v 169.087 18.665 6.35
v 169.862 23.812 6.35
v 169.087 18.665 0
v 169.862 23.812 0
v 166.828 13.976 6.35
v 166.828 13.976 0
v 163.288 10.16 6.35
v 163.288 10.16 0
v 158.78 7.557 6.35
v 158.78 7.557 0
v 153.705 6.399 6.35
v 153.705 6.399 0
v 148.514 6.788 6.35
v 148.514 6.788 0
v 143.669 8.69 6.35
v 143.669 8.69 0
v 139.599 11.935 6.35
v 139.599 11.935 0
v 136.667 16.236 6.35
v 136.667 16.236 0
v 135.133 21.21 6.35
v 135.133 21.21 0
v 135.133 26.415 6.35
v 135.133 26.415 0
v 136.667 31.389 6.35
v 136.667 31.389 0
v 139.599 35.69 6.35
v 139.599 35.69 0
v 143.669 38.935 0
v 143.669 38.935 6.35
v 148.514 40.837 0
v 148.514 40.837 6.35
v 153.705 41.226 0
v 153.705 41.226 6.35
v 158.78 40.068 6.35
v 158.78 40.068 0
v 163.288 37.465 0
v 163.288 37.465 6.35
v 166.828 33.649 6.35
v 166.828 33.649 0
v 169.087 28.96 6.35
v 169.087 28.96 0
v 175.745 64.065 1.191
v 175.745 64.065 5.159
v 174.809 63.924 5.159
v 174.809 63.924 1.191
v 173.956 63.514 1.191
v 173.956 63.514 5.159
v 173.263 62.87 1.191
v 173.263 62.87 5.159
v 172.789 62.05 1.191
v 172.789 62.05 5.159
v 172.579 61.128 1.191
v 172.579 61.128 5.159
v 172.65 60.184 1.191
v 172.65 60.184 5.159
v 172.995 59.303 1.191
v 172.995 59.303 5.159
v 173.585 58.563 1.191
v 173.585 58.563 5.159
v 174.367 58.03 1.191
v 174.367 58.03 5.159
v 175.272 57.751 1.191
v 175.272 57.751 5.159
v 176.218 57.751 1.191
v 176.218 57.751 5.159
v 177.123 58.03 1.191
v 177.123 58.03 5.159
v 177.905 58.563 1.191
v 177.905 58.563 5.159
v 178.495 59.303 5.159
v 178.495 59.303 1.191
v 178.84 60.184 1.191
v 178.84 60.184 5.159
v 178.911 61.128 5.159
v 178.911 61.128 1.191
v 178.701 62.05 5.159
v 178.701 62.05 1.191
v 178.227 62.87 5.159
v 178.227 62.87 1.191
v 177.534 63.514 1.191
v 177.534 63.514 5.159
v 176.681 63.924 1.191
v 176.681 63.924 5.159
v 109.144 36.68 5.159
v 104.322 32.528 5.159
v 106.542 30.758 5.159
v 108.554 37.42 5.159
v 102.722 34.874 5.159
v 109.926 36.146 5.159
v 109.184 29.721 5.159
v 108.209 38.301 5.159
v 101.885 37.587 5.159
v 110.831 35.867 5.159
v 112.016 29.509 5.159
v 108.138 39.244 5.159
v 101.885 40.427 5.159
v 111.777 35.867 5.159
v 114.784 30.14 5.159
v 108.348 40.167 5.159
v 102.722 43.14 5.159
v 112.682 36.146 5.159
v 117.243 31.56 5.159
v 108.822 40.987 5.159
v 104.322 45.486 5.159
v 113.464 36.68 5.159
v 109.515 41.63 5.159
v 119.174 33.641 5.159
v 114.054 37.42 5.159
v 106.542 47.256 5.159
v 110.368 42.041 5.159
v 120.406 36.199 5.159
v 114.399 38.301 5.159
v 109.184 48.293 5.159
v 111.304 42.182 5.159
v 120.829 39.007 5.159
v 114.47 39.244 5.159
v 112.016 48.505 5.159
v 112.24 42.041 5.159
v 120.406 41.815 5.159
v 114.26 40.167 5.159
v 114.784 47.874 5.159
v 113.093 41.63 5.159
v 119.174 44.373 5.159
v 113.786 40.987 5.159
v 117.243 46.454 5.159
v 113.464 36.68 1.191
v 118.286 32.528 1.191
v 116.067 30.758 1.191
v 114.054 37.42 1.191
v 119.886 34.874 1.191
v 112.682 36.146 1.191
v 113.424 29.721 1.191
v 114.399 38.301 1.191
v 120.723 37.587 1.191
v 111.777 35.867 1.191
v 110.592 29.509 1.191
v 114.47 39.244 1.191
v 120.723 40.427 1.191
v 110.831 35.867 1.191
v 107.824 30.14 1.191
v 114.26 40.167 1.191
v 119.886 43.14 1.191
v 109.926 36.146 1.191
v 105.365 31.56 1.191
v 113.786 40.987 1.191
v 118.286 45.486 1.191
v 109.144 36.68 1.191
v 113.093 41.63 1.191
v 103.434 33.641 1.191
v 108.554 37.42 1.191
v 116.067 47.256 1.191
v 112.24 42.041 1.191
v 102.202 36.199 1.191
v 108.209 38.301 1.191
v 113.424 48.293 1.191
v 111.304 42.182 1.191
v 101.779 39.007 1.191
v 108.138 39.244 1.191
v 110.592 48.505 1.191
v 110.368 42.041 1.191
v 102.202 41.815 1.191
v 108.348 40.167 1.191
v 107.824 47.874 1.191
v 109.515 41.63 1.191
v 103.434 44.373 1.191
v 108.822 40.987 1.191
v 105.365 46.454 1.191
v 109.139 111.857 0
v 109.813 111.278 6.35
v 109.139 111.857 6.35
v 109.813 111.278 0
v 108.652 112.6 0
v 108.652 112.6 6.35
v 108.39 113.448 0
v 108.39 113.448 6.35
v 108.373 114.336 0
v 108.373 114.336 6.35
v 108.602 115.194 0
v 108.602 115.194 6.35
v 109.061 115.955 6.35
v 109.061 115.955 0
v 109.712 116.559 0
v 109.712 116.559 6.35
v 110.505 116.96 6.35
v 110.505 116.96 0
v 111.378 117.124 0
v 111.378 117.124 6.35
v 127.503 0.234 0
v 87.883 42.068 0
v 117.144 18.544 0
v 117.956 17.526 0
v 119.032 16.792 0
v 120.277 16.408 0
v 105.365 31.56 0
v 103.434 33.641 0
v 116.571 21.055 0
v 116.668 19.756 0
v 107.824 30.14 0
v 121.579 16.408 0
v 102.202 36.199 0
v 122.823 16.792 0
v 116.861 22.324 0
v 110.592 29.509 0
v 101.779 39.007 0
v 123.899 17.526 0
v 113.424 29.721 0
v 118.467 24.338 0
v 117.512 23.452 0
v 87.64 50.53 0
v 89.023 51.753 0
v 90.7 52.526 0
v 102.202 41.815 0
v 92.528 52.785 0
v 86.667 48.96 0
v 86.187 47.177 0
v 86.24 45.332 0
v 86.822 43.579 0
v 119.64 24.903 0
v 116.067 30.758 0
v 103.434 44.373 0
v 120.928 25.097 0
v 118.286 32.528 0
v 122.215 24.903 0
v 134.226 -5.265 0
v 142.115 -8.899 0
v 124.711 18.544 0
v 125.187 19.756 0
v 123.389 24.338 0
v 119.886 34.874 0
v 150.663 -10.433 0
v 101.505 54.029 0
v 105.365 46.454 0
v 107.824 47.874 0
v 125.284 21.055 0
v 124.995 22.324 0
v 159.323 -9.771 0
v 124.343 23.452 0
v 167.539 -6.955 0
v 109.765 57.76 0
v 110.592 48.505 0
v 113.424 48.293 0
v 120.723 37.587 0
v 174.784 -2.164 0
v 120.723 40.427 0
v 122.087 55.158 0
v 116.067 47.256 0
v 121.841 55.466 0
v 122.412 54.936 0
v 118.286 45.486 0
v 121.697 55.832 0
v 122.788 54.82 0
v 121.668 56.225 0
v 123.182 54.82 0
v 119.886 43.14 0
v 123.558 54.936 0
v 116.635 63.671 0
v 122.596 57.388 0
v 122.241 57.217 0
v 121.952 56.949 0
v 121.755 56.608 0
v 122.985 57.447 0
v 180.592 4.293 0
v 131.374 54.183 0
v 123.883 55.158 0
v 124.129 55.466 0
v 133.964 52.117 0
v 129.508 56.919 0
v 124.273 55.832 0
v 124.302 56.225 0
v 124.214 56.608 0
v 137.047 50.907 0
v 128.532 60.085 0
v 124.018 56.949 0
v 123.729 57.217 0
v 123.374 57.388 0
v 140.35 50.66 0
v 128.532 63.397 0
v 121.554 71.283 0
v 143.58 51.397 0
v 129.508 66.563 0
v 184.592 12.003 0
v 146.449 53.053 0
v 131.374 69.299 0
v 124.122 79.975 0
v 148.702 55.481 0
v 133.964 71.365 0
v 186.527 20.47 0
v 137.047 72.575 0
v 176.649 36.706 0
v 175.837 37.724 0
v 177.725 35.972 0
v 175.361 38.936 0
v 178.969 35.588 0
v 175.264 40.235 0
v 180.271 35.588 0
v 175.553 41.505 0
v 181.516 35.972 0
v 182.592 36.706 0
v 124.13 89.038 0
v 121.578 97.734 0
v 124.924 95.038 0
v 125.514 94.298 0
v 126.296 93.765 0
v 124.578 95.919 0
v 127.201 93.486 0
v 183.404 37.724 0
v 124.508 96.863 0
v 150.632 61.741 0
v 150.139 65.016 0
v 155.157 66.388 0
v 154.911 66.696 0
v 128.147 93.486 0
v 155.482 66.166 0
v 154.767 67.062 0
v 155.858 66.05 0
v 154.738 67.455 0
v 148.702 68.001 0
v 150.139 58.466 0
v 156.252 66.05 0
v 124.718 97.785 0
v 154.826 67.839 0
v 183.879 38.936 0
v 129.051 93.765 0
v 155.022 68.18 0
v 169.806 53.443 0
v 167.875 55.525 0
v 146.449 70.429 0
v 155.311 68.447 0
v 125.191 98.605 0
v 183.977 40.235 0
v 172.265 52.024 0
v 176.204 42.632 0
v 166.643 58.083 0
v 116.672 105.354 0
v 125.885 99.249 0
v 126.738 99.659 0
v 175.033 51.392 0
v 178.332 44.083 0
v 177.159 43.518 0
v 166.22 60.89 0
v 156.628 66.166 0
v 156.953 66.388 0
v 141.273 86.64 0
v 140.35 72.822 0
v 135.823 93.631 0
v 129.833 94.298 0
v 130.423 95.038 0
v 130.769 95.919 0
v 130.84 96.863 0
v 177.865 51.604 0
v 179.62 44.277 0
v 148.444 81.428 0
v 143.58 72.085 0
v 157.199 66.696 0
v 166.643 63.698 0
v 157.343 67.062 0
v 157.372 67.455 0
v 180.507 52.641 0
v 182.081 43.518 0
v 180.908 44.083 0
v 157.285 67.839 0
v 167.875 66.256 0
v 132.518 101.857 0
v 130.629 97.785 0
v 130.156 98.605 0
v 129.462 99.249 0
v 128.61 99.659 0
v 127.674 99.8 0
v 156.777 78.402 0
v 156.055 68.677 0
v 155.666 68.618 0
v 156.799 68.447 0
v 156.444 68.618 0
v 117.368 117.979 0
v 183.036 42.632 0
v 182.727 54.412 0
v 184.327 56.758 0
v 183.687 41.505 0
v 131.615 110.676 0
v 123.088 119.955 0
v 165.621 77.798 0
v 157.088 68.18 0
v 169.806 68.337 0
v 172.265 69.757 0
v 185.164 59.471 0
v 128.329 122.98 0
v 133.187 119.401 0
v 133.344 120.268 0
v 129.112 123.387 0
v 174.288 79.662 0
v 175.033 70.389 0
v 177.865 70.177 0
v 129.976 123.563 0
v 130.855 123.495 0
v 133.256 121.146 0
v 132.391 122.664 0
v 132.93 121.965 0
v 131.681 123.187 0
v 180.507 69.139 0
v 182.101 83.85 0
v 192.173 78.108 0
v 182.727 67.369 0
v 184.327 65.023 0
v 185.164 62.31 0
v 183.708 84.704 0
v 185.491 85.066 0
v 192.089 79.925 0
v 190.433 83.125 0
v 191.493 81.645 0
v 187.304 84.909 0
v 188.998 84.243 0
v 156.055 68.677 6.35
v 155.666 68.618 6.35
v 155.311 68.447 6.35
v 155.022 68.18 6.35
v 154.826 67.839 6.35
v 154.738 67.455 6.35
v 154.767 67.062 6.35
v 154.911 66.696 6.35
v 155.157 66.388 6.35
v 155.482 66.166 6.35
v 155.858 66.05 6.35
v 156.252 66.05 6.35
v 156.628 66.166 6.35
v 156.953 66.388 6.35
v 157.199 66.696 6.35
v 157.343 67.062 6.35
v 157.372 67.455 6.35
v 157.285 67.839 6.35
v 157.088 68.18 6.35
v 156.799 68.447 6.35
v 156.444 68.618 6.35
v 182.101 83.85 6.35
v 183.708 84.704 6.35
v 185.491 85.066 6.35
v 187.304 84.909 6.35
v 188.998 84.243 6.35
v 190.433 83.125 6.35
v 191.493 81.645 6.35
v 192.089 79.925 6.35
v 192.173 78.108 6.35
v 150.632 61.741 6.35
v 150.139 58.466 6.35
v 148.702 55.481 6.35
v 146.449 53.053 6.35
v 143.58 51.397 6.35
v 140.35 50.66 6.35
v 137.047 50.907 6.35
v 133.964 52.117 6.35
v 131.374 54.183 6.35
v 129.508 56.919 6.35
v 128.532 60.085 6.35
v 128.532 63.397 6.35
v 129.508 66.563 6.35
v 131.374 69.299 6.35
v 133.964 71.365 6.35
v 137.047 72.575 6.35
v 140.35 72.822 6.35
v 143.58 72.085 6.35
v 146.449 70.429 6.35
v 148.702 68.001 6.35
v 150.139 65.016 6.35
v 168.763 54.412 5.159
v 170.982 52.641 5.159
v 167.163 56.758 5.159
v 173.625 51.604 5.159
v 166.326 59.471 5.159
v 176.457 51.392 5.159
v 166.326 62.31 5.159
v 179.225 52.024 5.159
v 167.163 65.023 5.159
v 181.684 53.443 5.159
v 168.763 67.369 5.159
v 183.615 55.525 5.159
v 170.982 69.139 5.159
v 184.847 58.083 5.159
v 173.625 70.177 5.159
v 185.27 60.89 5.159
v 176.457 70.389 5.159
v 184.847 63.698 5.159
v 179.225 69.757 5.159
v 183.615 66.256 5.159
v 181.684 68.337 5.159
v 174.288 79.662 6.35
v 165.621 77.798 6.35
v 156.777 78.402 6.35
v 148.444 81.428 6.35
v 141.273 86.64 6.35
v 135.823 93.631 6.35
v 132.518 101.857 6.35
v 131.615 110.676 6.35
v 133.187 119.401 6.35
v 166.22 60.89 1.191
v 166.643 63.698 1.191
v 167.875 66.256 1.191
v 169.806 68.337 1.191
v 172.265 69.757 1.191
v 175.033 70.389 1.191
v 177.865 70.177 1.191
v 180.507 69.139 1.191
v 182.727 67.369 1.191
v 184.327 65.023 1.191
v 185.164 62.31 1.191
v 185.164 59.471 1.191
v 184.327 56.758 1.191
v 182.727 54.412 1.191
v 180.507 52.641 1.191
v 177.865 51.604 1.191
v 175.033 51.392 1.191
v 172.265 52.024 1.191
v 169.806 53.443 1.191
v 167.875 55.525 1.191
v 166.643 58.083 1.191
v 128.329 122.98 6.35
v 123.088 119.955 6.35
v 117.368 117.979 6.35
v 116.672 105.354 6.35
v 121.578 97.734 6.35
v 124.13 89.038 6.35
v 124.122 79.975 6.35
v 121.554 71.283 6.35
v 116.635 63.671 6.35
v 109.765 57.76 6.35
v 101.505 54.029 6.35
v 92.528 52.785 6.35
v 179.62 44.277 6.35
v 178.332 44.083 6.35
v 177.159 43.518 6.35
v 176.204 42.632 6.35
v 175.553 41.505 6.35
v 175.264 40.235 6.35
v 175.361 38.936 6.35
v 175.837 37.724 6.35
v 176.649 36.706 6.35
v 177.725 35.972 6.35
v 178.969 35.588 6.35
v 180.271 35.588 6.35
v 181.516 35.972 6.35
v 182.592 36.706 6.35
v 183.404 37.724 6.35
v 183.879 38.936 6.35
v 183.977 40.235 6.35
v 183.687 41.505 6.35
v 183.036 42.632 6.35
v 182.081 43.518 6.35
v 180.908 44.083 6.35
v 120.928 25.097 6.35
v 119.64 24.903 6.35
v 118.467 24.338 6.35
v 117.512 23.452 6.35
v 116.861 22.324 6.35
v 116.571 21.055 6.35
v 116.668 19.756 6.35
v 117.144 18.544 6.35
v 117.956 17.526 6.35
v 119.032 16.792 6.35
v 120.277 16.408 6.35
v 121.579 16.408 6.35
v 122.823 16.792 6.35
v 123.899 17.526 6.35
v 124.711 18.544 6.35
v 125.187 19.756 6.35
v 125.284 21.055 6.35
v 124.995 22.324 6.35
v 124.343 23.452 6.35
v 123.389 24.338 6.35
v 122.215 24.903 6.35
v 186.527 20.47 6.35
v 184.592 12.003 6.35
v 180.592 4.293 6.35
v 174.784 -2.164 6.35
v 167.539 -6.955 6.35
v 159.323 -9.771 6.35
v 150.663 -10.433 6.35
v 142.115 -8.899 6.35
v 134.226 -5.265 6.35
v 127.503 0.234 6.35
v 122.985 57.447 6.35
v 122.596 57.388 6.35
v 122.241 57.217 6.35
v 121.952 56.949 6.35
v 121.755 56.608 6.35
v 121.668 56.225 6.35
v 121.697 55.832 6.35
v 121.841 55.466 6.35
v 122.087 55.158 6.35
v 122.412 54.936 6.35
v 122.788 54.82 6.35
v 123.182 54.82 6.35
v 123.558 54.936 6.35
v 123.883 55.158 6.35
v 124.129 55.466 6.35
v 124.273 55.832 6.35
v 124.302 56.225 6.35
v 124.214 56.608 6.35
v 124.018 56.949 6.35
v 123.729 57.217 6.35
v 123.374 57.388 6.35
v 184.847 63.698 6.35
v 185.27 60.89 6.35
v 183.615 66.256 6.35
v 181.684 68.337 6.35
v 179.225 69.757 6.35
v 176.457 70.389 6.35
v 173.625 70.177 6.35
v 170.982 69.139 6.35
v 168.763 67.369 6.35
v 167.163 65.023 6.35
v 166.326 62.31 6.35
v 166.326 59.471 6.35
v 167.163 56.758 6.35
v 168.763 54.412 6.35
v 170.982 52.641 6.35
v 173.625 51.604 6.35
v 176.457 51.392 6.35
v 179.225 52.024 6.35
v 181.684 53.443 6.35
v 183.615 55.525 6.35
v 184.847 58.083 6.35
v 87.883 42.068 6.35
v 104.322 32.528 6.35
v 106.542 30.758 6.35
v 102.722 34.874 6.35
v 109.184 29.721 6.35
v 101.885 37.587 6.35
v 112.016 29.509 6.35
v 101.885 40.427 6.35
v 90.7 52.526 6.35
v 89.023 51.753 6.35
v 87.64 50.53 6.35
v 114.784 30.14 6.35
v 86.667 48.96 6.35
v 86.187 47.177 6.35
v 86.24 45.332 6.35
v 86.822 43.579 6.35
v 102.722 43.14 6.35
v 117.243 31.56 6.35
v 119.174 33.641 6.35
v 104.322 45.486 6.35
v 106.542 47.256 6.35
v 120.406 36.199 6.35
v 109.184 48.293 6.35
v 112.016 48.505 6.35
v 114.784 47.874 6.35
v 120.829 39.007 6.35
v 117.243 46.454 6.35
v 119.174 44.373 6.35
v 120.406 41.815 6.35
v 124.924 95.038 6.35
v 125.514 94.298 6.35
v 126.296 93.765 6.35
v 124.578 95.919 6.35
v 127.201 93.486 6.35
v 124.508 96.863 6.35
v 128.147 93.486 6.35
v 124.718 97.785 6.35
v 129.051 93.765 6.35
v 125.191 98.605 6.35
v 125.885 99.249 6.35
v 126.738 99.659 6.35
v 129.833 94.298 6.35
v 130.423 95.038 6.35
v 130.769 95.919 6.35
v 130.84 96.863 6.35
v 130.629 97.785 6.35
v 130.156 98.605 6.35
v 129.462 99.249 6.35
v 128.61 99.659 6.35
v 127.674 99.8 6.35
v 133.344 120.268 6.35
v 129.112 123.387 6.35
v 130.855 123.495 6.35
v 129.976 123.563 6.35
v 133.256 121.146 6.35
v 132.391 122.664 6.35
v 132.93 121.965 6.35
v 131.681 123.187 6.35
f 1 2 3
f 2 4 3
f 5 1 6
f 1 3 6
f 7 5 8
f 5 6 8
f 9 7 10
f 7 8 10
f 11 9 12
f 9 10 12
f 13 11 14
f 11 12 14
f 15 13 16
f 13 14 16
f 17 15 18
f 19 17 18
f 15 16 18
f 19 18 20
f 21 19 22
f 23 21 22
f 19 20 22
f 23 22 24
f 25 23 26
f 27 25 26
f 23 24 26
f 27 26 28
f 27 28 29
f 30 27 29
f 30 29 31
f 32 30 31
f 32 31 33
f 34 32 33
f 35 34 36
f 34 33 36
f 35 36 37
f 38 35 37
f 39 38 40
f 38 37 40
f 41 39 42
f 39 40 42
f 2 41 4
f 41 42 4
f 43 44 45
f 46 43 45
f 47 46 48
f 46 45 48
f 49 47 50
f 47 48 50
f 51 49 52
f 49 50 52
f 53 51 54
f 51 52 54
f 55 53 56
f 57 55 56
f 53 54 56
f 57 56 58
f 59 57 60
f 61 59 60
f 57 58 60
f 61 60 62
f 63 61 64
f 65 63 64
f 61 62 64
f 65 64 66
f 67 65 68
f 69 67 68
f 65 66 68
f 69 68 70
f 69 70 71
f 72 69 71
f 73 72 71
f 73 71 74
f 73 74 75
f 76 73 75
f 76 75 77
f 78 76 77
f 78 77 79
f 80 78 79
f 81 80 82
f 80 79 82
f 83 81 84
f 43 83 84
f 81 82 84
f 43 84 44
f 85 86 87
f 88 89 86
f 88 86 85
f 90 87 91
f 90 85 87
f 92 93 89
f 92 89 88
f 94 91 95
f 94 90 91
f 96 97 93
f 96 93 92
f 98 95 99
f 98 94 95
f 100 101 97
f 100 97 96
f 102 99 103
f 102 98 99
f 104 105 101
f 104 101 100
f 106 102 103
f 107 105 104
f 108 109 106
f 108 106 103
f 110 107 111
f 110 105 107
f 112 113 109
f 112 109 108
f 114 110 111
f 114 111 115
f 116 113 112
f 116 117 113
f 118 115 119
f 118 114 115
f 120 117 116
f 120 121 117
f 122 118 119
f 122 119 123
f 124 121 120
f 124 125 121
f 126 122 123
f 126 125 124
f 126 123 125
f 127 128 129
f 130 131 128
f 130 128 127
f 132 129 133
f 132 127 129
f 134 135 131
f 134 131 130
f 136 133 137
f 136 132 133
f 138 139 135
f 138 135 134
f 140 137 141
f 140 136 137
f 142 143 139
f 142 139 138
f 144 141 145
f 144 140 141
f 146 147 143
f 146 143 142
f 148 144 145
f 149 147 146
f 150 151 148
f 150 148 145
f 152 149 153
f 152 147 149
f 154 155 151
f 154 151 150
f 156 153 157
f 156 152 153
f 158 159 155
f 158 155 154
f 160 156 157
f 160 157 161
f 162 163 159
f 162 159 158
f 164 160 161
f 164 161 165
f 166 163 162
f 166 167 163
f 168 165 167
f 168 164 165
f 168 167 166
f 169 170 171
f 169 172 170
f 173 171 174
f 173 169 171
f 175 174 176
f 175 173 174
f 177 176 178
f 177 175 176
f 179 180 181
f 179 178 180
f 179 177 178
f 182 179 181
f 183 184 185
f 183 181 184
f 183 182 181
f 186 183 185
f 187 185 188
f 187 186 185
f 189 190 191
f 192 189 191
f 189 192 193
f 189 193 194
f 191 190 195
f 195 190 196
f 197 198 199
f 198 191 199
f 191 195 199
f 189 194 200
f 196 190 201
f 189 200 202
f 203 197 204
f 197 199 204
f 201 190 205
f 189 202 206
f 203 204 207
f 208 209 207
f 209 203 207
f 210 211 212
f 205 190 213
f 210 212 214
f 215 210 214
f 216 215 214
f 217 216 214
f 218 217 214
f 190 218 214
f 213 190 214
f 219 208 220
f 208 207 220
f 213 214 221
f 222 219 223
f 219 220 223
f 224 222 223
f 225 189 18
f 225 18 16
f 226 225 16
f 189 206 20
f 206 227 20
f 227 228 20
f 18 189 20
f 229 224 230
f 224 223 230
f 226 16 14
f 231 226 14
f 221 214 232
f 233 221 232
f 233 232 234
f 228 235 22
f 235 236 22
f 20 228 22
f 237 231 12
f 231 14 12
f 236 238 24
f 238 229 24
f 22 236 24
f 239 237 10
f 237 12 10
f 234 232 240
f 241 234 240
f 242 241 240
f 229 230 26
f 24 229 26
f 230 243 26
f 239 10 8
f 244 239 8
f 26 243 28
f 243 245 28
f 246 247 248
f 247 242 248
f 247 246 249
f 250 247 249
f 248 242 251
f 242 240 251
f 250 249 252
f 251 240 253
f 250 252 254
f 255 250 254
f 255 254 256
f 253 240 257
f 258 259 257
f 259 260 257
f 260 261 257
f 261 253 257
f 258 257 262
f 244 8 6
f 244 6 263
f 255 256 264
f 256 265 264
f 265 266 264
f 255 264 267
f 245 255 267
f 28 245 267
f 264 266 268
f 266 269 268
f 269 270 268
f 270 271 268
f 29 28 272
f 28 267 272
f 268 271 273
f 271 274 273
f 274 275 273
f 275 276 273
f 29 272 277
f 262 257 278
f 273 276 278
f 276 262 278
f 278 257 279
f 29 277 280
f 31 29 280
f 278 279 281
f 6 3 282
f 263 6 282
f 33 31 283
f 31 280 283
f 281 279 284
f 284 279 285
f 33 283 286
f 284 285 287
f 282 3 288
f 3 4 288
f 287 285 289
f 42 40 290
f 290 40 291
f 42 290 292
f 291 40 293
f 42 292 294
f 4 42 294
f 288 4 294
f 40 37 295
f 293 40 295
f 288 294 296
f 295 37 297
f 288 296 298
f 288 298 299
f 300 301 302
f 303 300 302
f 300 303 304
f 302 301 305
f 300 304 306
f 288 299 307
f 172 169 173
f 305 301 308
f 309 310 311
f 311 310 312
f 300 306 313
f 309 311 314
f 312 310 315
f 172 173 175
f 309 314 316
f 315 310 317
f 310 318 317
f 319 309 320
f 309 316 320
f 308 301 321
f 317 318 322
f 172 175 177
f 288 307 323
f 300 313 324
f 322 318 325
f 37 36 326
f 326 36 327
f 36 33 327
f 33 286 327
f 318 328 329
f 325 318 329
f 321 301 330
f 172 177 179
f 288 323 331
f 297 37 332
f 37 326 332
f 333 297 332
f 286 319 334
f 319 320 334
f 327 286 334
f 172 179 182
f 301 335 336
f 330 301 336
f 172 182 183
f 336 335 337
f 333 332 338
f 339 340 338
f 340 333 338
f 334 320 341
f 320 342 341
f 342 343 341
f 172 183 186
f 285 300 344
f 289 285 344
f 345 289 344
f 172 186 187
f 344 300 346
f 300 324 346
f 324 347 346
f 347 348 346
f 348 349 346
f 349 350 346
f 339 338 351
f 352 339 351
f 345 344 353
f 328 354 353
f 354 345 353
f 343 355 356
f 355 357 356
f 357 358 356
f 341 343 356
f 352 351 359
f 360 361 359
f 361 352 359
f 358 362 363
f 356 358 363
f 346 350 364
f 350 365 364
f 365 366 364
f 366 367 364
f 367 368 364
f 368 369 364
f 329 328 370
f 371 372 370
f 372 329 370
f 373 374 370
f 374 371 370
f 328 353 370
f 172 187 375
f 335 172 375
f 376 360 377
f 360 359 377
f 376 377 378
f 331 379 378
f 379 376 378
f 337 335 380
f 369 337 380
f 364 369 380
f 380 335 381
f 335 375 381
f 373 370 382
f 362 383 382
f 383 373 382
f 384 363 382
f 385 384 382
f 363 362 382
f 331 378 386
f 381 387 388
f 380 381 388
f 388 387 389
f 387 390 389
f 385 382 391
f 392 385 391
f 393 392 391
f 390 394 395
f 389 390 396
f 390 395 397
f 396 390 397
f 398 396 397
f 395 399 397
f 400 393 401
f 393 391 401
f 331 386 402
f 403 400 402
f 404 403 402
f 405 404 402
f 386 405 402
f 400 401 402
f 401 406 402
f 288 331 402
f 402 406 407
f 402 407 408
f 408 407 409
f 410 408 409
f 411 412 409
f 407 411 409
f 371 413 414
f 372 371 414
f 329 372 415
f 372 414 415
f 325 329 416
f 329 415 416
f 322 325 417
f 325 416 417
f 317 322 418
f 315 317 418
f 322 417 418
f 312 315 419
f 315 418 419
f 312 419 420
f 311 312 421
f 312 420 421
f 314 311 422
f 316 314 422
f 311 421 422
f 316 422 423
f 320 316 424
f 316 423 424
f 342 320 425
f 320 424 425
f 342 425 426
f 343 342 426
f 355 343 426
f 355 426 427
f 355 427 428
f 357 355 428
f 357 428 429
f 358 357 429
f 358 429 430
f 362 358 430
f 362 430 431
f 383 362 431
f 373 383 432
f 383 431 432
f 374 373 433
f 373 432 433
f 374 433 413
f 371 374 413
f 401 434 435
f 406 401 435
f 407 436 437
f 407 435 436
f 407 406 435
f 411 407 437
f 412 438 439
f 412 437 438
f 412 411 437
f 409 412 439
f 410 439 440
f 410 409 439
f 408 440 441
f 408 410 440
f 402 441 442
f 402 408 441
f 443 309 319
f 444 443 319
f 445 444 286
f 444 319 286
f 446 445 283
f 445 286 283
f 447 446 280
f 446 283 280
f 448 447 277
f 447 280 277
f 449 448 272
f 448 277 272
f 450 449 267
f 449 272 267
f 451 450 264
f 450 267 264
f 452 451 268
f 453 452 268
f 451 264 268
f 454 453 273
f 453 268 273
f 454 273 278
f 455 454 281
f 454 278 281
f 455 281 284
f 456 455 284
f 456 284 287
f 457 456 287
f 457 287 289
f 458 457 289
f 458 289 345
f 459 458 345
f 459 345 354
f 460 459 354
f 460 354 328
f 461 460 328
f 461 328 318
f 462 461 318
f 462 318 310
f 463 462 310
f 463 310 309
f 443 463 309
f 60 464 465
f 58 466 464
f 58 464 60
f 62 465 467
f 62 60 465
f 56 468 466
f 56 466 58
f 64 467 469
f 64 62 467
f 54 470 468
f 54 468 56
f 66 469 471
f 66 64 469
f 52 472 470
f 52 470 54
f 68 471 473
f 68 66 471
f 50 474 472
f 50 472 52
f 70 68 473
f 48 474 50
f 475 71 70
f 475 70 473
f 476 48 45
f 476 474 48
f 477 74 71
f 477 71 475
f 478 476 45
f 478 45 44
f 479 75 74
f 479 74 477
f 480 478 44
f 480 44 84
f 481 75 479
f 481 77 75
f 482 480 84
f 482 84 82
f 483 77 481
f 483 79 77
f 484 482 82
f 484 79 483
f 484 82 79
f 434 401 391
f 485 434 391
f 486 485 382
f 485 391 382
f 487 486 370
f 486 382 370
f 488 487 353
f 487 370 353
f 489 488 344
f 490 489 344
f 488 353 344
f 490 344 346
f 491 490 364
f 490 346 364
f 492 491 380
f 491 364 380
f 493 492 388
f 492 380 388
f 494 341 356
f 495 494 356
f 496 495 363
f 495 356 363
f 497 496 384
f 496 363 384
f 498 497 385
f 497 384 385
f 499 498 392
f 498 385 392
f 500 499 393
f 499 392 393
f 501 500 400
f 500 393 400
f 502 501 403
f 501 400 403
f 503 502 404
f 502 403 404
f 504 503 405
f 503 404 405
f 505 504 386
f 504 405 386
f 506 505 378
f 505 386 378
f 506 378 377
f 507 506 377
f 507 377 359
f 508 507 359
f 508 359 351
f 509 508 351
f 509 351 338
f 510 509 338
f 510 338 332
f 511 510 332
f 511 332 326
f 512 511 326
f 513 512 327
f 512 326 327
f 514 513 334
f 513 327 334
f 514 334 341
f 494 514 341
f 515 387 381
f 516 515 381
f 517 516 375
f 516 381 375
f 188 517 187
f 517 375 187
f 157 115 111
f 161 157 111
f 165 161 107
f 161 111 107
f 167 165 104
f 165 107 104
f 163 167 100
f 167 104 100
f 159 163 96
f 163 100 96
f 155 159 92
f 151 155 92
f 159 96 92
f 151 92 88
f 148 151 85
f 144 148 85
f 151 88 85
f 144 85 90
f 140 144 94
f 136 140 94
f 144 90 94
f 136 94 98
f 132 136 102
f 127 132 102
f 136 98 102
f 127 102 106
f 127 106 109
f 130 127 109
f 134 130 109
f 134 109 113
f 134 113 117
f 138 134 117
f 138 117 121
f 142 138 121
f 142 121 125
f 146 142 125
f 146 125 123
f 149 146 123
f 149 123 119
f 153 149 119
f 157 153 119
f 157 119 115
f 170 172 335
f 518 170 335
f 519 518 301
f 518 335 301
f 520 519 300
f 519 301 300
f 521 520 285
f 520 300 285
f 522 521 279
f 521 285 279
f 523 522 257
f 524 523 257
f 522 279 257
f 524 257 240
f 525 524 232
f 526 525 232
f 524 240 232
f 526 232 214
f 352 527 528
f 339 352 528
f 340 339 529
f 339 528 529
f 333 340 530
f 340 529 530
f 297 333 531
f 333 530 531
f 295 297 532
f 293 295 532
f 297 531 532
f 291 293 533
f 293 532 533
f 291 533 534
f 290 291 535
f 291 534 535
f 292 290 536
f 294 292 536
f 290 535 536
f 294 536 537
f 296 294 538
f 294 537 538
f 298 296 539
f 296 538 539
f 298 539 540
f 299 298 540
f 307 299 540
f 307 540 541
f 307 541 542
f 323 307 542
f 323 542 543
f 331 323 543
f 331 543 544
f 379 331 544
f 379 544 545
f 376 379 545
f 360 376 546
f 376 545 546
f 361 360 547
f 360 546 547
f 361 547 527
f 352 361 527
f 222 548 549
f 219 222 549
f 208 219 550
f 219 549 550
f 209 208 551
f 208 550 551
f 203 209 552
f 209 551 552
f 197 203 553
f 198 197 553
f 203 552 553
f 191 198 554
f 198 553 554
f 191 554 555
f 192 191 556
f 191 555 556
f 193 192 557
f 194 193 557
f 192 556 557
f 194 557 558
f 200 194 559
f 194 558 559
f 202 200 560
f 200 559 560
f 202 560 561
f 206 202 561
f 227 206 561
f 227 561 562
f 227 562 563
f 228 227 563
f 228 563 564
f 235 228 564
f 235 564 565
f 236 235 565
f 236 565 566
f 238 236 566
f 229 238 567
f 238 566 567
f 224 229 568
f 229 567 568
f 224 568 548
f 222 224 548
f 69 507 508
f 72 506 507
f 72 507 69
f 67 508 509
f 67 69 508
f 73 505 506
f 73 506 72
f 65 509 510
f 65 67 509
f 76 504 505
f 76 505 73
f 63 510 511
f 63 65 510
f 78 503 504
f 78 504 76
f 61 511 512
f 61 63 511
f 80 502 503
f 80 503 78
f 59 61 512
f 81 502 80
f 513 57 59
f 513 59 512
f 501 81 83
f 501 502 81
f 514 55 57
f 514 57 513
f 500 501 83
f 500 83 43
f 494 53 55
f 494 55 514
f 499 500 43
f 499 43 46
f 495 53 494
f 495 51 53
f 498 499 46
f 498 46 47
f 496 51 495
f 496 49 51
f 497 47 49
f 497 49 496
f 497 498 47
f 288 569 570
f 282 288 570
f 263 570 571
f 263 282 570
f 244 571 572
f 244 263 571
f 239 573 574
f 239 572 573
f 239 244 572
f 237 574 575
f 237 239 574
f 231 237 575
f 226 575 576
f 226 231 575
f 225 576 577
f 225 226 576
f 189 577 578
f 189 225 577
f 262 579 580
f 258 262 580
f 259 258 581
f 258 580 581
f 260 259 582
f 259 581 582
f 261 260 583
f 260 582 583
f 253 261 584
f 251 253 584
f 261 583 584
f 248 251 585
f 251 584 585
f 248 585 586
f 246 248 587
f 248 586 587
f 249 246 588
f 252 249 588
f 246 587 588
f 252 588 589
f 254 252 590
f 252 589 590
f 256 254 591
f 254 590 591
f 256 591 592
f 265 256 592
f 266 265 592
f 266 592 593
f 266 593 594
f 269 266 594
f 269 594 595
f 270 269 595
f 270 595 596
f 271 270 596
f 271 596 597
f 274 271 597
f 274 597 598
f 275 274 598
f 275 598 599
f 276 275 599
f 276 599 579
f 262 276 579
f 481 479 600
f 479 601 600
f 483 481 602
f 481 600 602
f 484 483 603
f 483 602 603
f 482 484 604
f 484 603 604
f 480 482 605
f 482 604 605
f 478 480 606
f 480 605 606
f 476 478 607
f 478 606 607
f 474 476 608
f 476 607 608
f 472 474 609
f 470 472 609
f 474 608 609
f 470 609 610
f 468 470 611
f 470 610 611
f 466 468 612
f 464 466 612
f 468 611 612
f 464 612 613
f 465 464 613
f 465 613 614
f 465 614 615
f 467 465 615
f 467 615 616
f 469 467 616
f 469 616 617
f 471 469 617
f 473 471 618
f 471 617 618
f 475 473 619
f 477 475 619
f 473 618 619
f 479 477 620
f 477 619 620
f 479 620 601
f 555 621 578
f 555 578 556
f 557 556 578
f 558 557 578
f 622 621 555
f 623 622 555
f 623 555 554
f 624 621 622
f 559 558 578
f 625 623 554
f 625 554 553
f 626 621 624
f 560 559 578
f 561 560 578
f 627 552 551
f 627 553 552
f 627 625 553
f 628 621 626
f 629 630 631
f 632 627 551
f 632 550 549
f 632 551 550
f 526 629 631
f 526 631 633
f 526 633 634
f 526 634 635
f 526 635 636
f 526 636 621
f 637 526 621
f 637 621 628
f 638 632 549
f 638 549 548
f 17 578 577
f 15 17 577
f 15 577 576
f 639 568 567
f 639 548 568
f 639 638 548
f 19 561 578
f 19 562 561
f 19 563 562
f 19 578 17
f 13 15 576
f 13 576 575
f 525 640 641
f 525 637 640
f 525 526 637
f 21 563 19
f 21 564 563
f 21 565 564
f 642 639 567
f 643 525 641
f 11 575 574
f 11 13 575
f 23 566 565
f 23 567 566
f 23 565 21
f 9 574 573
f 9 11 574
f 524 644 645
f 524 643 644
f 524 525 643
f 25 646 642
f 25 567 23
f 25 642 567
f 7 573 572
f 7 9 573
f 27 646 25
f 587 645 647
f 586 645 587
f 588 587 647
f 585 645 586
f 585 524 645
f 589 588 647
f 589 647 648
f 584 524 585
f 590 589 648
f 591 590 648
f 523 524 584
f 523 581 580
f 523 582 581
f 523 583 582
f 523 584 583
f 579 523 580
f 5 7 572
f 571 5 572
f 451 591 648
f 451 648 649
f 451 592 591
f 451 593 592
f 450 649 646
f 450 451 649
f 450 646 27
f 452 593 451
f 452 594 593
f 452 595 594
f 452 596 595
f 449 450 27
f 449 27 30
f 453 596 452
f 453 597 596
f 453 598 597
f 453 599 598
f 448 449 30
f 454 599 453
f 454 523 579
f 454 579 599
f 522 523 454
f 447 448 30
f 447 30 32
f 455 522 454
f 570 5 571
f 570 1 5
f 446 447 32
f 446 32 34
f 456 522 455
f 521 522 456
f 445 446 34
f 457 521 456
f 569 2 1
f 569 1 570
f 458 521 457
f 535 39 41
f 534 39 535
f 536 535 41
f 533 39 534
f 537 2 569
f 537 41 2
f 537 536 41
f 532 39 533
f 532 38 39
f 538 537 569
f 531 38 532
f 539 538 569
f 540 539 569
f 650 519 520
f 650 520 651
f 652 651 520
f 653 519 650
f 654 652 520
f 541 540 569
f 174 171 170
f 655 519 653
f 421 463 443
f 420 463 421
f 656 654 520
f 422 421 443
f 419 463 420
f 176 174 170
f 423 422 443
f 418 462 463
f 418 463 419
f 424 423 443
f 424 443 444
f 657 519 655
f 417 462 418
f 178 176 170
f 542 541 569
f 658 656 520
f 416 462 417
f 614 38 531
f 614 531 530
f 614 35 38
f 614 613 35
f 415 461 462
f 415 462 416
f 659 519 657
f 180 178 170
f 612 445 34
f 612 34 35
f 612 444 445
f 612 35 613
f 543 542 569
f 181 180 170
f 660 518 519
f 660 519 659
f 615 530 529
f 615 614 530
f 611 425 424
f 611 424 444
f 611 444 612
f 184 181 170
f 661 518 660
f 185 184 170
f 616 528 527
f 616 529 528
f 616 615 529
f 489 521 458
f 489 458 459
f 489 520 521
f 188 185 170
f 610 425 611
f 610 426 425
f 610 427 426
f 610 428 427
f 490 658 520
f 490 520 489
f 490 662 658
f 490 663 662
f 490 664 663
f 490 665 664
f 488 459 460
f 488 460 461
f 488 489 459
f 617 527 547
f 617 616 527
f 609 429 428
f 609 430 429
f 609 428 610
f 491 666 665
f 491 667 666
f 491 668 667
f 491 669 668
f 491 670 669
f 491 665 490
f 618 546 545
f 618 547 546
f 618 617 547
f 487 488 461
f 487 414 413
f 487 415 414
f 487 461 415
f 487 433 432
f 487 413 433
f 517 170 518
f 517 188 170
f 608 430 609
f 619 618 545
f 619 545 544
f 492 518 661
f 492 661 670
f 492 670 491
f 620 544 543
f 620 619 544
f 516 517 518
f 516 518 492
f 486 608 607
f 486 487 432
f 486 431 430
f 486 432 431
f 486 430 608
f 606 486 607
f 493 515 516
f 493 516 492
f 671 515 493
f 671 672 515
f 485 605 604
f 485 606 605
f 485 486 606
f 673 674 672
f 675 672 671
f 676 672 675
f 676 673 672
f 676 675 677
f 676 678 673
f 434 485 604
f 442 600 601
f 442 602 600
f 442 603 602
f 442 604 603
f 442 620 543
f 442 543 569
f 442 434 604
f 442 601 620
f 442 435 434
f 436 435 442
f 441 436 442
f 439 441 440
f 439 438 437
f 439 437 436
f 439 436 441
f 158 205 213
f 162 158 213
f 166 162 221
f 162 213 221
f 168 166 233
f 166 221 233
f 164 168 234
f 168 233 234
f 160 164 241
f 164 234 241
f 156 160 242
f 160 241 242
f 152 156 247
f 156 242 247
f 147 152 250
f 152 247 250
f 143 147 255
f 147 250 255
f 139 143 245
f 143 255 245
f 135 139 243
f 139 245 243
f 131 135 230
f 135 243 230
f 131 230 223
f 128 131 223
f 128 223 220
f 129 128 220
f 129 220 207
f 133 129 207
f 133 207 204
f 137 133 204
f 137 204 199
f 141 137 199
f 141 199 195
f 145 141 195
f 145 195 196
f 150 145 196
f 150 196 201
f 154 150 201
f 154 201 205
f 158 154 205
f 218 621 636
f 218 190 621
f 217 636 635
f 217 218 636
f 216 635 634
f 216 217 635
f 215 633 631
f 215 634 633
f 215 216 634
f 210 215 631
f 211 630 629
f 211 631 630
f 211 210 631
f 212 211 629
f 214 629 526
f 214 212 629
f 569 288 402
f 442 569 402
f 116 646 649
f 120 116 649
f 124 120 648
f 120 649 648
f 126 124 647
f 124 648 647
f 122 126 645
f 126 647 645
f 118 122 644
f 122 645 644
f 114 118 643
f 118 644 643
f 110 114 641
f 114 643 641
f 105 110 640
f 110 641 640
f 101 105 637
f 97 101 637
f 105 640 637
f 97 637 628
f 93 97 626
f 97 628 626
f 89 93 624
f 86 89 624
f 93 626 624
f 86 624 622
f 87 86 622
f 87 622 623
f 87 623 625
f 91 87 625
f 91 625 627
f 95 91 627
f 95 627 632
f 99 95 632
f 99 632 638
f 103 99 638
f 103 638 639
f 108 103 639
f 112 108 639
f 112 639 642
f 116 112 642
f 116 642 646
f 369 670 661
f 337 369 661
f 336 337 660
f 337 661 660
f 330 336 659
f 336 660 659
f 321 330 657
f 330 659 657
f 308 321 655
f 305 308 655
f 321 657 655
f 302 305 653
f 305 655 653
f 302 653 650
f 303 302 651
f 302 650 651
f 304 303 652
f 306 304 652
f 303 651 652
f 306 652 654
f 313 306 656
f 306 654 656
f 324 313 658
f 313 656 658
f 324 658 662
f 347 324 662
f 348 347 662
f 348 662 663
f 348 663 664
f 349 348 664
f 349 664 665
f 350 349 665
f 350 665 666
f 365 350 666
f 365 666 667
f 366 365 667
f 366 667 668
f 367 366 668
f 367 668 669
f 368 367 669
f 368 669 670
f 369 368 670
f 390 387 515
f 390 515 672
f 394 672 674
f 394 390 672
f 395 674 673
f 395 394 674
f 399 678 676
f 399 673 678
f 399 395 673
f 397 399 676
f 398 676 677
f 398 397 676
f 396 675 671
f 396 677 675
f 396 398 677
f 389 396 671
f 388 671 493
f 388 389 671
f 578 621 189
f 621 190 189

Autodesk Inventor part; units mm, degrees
ref_plane "YZ Plane" through (0, 0, 0) normal (1, 0, 0) x (0, 1, 0)
ref_plane "XZ Plane" through (0, 0, 0) normal (0, 1, 0) x (-1, 0, 0)
ref_plane "XY Plane" through (0, 0, 0) normal (0, 0, 1) x (1, 0, 0)
sketch "Sketch1" plane through (0, 0, 0) normal (0, 0, 1) x (1, 0, 0)
  line L0 (0, 0) -> (304.8, 0) construction
  line L1 (304.8, 0) -> (304.8, 50.8) construction
  line L2 (304.8, 50.8) -> (0, 50.8) construction
  line L3 (0, 50.8) -> (0, 0) construction
  circle A0 centre (152.4, 23.8125) radius 17.4625
  arc A1 (186.526662, 20.469591) -> (127.726757, 0) centre (152.4, 23.8125) ccw
  circle A2 centre (152.4, 23.8125) radius 26.035 construction
  line L4 (152.4, 23.8125) -> (139.519977, 61.741013) construction
  circle A3 centre (139.519977, 61.741013) radius 9.525 construction
  circle A4 centre (139.519977, 61.741013) radius 17.78 construction
  circle A5 centre (91.561866, 85.09) radius 31.75 construction
  arc A6 (133.1868, 119.400632) -> (182.101149, 83.849872) centre (163.342398, 109.465722) ccw
  circle A7 centre (109.531215, 150.050573) radius 31.75 construction
  line L5 (0, 50.8) -> (0, 53.34) construction
  line L6 (0, 53.34) -> (304.8, 53.34) construction
  line L7 (304.8, 53.34) -> (304.8, 50.8) construction
  circle A8 centre (139.519977, 61.741013) radius 21.59 construction
  circle A9 centre (152.4, 23.8125) radius 46.99 construction
  circle A10 centre (152.4, 23.8125) radius 50.8 construction
  arc A11 (86.386473, 79.456368) -> (92.43632, 92.689857) centre (91.561866, 85.09) ccw construction
  circle A12 centre (163.342398, 109.465722) radius 7.65 construction
  arc A13 (116.774938, 152.510446) -> (102.287492, 147.5907) centre (109.531215, 150.050573) ccw construction
  circle A14 centre (139.519977, 61.741013) radius 22.9 construction
  line L8 (86.386473, 79.456368) -> (124.027623, 44.87694) construction
  line L9 (170.878164, 108.148633) -> (162.078023, 57.798354) construction
  line L10 (92.43632, 92.689857) -> (91.561866, 85.09) construction
  line L11 (91.561866, 85.09) -> (86.386473, 79.456368) construction
  circle A15 centre (127.673753, 96.62524) radius 3.175 construction
  circle A16 centre (127.673753, 96.62524) radius 7.9375 construction
  line L12 (92.43632, 92.689857) -> (126.766436, 88.739767) construction
  line L13 (133.195304, 90.922926) -> (158.02084, 114.961496) construction
  line L14 (158.02084, 114.961496) -> (163.342398, 109.465722) construction
  line L15 (170.878164, 108.148633) -> (163.342398, 109.465722) construction
  line L16 (139.519977, 61.741013) -> (127.673753, 96.62524) construction
  line L17 (91.561866, 85.09) -> (163.342398, 109.465722) construction
  line L18 (152.4, 23.8125) -> (91.561866, 85.09) construction
  line L19 (152.4, 23.8125) -> (163.342398, 109.465722) construction
  circle A17 centre (127.673753, 96.62524) radius 9.2075 construction
  circle A18 centre (127.673753, 96.62524) radius 6.1595 construction
  arc A19 (92.43632, 92.689857) -> (86.386473, 79.456368) centre (91.561866, 85.09) ccw construction
  circle A20 centre (163.342398, 109.465722) radius 25.4 construction
  circle A21 centre (109.531215, 150.050573) radius 25.4 construction
  line L20 (104.762695, 113.965606) -> (78.361037, 56.214394) construction
  circle A22 centre (91.561866, 85.09) radius 25.4 construction
  line L21 (139.595033, 160.25985) -> (79.467396, 139.841297) construction
  circle A23 centre (139.519977, 61.741013) radius 11.1125
  arc A24 (100.13733, 146.057475) -> (119.680223, 151.623238) centre (109.908777, 148.840356) ccw construction
  line L22 (109.093738, 151.240444) -> (85.48016, 141.883152) construction
  line L23 (109.908777, 148.840356) -> (85.48016, 141.883152) construction
  line L24 (109.093738, 151.240444) -> (132.707317, 160.597736) construction
  line L25 (109.908777, 148.840356) -> (134.337393, 155.79756) construction
  arc A25 (134.92109, 161.474982) -> (130.493544, 159.72049) centre (132.707317, 160.597736) ccw construction
  arc A26 (132.047211, 155.145322) -> (136.627576, 156.449798) centre (134.337393, 155.79756) ccw construction
  arc A27 (132.047211, 155.145322) -> (130.493544, 159.72049) centre (85.48016, 141.883152) ccw construction
  arc A28 (136.627576, 156.449798) -> (134.92109, 161.474982) centre (85.48016, 141.883152) ccw construction
  line L26 (132.707317, 160.597736) -> (134.92109, 161.474982) construction
  line L27 (134.337393, 155.79756) -> (136.627576, 156.449798) construction
  arc A29 (119.680223, 151.623238) -> (118.53917, 154.983361) centre (85.48016, 141.883152) ccw construction
  arc A30 (100.13733, 146.057475) -> (99.648307, 147.497527) centre (85.48016, 141.883152) ccw construction
  line L28 (104.40145, 107.079075) -> (92.701327, 84.534295) construction
  line L29 (81.001203, 61.989515) -> (90.396097, 85.588158) construction
  arc A31 (100.671763, 111.399174) -> (98.91022, 106.974429) centre (99.790992, 109.186802) ccw construction
  arc A32 (103.304563, 104.965502) -> (105.498337, 109.192648) centre (104.40145, 107.079075) ccw construction
  arc A33 (103.304563, 104.965502) -> (98.91022, 106.974429) centre (81.001203, 61.989515) ccw construction
  line L30 (99.790992, 109.186802) -> (100.671763, 111.399174) construction
  line L31 (104.40145, 107.079075) -> (105.498337, 109.192648) construction
  arc A34 (105.498337, 109.192648) -> (100.671763, 111.399174) centre (81.001203, 61.989515) ccw construction
  arc A35 (118.53917, 154.983361) -> (99.648307, 147.497527) centre (109.093738, 151.240444) ccw construction
  arc A36 (88.021277, 75.516383) -> (97.381376, 93.552207) centre (92.701327, 84.534295) ccw construction
  line L32 (90.396097, 85.588158) -> (99.790992, 109.186802) construction
  line L33 (92.701327, 84.534295) -> (81.001203, 61.989515) construction
  arc A37 (88.021277, 75.516383) -> (86.63814, 76.148701) centre (81.001203, 61.989515) ccw construction
  arc A38 (97.381376, 93.552207) -> (94.154055, 95.027616) centre (81.001203, 61.989515) ccw construction
  arc A39 (94.154055, 95.027616) -> (86.63814, 76.148701) centre (90.396097, 85.588158) ccw construction
  line L34 (163.342398, 109.465722) -> (140.898549, 121.35831) construction
  line L35 (163.342398, 109.465722) -> (185.786247, 97.573135) construction
  circle A40 centre (139.519977, 61.741013) radius 22.9 construction
  arc A41 (102.287492, 147.5907) -> (116.774938, 152.510446) centre (109.531215, 150.050573) ccw construction
  arc A42 (102.287492, 147.5907) -> (102.622578, 146.765267) centre (109.531215, 150.050573) ccw construction
  circle A43 centre (90.396097, 85.588158) radius 31.75
  arc A44 (107.326481, 112.71527) -> (92.528233, 52.784767) centre (92.701327, 84.534295) ccw
  line L36 (100.671763, 111.399174) -> (102.139715, 115.086462) construction
  line L37 (105.498337, 109.192648) -> (107.326481, 112.71527) construction
  arc A45 (107.326481, 112.71527) -> (102.139715, 115.086462) centre (81.001203, 61.989515) ccw
  circle A46 centre (109.093738, 151.240444) radius 31.75
  arc A47 (120.148005, 118.786726) -> (128.329199, 122.980144) centre (109.908777, 148.840356) ccw
  line L38 (134.92109, 161.474982) -> (138.610711, 162.937059) construction
  line L39 (136.627576, 156.449798) -> (140.444547, 157.536861) construction
  arc A48 (140.444547, 157.536861) -> (138.610711, 162.937059) centre (85.48016, 141.883152) ccw
  line L40 (91.561866, 85.09) -> (109.531215, 150.050573) construction
  line L41 (109.531215, 150.050573) -> (163.342398, 109.465722) construction
  line L42 (139.519977, 61.741013) -> (109.531215, 150.050573) construction
  circle A49 centre (139.519977, 61.741013) radius 17.4625
  line L43 (139.519977, 61.741013) -> (122.984877, 56.125911) construction
  line L44 (139.519977, 61.741013) -> (156.055077, 67.356115) construction
  line L45 (139.519977, 61.741013) -> (156.055077, 67.356115) construction
  circle A50 centre (139.519977, 61.741013) radius 26.71 construction
  circle A51 centre (111.304007, 39.007024) radius 9.525 construction
  circle A52 centre (175.74499, 60.890333) radius 9.525 construction
  line L46 (0, 3.81) -> (304.8, 3.81) construction
  arc A53 (86.506583, 75.488588) -> (95.723262, 93.598122) centre (91.114923, 84.543355) ccw
  arc A54 (92.484334, 95.047874) -> (85.118472, 76.10991) centre (88.801403, 85.578892) ccw
  arc A55 (95.723262, 93.598122) -> (92.484334, 95.047874) centre (79.594076, 61.906436) ccw
  circle A56 centre (120.927752, 20.728389) radius 5.588
  circle A57 centre (179.620141, 39.908401) radius 5.588
  line L47 (152.4, 23.8125) -> (304.8, 25.4) construction
  line L48 (179.620141, 39.908401) -> (152.4, 23.8125) construction
  line L49 (152.4, 23.8125) -> (120.927752, 20.728389) construction
  line L50 (67.343611, 63.755949) -> (87.883117, 42.06842)
  line L51 (186.526662, 20.469591) -> (192.172651, 78.107645)
  arc A58 (109.813264, 111.278343) -> (111.377577, 117.124349) centre (111.524457, 113.952748) ccw
  arc A59 (128.329199, 122.980144) -> (133.1868, 119.400632) centre (130.171241, 120.394123) ccw
  arc A60 (111.377577, 117.124349) -> (120.148005, 118.786726) centre (109.908777, 148.840356) ccw
  arc A61 (128.329199, 122.980144) -> (111.377577, 117.124349) centre (109.908777, 148.840356) ccw
  arc A62 (137.993696, 128.583928) -> (133.1868, 119.400632) centre (163.342398, 109.465722) ccw
  arc A63 (109.813264, 111.278343) -> (107.326481, 112.71527) centre (92.701327, 84.534295) ccw
  arc A64 (92.528233, 52.784767) -> (87.883117, 42.06842) centre (92.493614, 46.434861) ccw
  arc A65 (182.101149, 83.849872) -> (192.172651, 78.107645) centre (185.852899, 78.726702) ccw
  arc A66 (192.172651, 78.107645) -> (182.101149, 83.849872) centre (185.852899, 78.726702) ccw
  arc A67 (97.105346, 50.8) -> (92.528233, 52.784767) centre (92.493614, 46.434861) ccw
  arc A68 (87.883117, 42.06842) -> (97.105346, 50.8) centre (92.493614, 46.434861) ccw
  line L52 (87.883117, 42.06842) -> (127.503315, 0.233714)
  line L53 (192.172651, 78.107645) -> (194.941159, 106.370436)
  arc A69 (182.101149, 83.849872) -> (137.993696, 128.583928) centre (163.342398, 109.465722) ccw
  arc A70 (180.251465, 3.81) -> (186.526662, 20.469591) centre (152.4, 23.8125) ccw
  arc A71 (127.726757, 0) -> (180.251465, 3.81) centre (152.4, 23.8125) ccw
  arc A72 (92.528233, 52.784767) -> (109.813264, 111.278343) centre (92.701327, 84.534295) ccw
  arc A73 (133.1868, 119.400632) -> (128.329199, 122.980144) centre (130.171241, 120.394123) ccw
  arc A74 (111.377577, 117.124349) -> (109.813264, 111.278343) centre (111.524457, 113.952748) ccw
  circle A75 centre (152.4, 23.8125) radius 10.208942
  point P0 (133.582269, 158.217994)
  point P1 (102.122529, 108.190485)
  dimension "d122" = 63.5
  dimension "d1" = 50.8
  dimension "d2" = 34.925
  dimension "d3" = 23.8125
  dimension "d4" = 152.4
  dimension "d7" = 68.58
  dimension "d8" = 52.07
  dimension "d9" = 19.05
  dimension "d10" = 35.56
  dimension "d11" = 40.0558
  dimension "d12" = 63.5
  dimension "d13" = 63.5
  dimension "d14" = 63.5
  dimension "d15" = 2.54
  dimension "d16" = 304.8
  dimension "d17" = 43.18
  dimension "d18" = 93.98
  dimension "d19" = 101.6
  dimension "d21" = 15.3
  dimension "d22" = 15.3
  dimension "d29" = 45.8
  dimension "d30" = 143.991
  dimension "d31" = 6.35
  dimension "d32" = 15.875
  dimension "d33" = 143.991
  dimension "d35" = 18.415
  dimension "d37" = 12.319
  dimension "d40" = 50.8
  dimension "d41" = 50.8
  dimension "d42" = 18.0044
  dimension "d43" = 18.0044
  dimension "d44" = 50.8
  dimension "d57" = 22.225
  dimension "d67" = 25.4
  dimension "d68" = 25.4
  dimension "d69" = 2.86
  dimension "d70" = 25.4
  dimension "d71" = 25.4
  dimension "d72" = 4.7625
  dimension "d75" = 2.86
  dimension "d80" = 4.7625
  dimension "d82" = 4.7625
  dimension "d83" = 50.8
  dimension "d84" = 50.8
  dimension "d85" = 10.16
  dimension "d97" = 48.41875
  dimension "d99" = 20.32
  dimension "d101" = 25.4
  dimension "d102" = 25.4
  dimension "d103" = 10.16
  dimension "d105" = 18.0044
  dimension "d106" = 18.0044
  dimension "d107" = 45.8
  dimension "d109" = 7.65
  dimension "d114" = 63.5
  dimension "d115" = 63.5
  dimension "d116" = 57.15
  dimension "d123" = 63.5
  dimension "d128" = 93.26256
  dimension "d129" = 34.925
  dimension "d130" = 0
  dimension "d138" = 53.42
  dimension "d139" = 19.05
  dimension "d140" = 19.05
  dimension "d154" = 3.81
sketch "Sketch1 outline for Plates" plane through (0, 0, 0) normal (0, 0, 1) x (1, 0, 0)
  arc A0 (111.377577, 117.124349) -> (109.813264, 111.278343) centre (111.524457, 113.952748) ccw
  arc A1 (109.813264, 111.278343) -> (92.528233, 52.784767) centre (92.701327, 84.534295) cw
  arc A2 (92.528233, 52.784767) -> (87.883117, 42.06842) centre (92.493614, 46.434861) ccw
  line L0 (87.883117, 42.06842) -> (127.503315, 0.233714)
  arc A3 (127.503315, 0.233714) -> (186.526662, 20.469591) centre (152.4, 23.8125) ccw
  line L1 (186.526662, 20.469591) -> (192.172651, 78.107645)
  arc A4 (192.172651, 78.107645) -> (182.101149, 83.849872) centre (185.852899, 78.726702) ccw
  arc A5 (182.101149, 83.849872) -> (133.1868, 119.400632) centre (163.342398, 109.465722) cw
  arc A6 (133.1868, 119.400632) -> (128.329199, 122.980144) centre (130.171241, 120.394123) ccw
  arc A7 (128.329199, 122.980144) -> (111.377577, 117.124349) centre (109.908777, 148.840356) cw
extrude "Plates" add sketch "Sketch1 outline for Plates" along normal blind 6.35
sketch "Sketch1 outline for Bearing Cuts" plane through (0, 0, 0) normal (0, 0, 1) x (1, 0, 0)
  circle A0 centre (139.519977, 61.741013) radius 11.1125
  circle A1 centre (152.4, 23.8125) radius 17.4625
extrude "Bearing Cuts" cut sketch "Sketch1 outline for Bearing Cuts" along normal blind 25.4
hole "Encoder Mounting Holes" at (122.984877, 56.125911, 0) at (156.055077, 67.356115, 0) direction (0, 0, 1) diameter 2.6416 end through all thread size "6-32 UNC" class "2B" standard "ANSI Unified Screw Threads"
hole "10-32 Pem Nut Holes" at (81.001203, 61.989515, 0) at (85.48016, 141.883152, 0) at (100.671763, 111.399174, 0) at (105.498337, 109.192648, 0) at (102.122529, 108.190485, 0) at (127.673753, 96.62524, 0) at (111.304007, 39.007024, 0) at (175.74499, 60.890333, 0) direction (0, 0, 1) diameter 6.35 end through all
hole "1/4-20 Pem Nut Holes" at (185.786247, 97.573135, 0) at (140.898549, 121.35831, 0) at (120.927752, 20.728389, 0) at (179.620141, 39.908401, 0) at (133.582269, 158.217994, 0) direction (0, 0, 1) diameter 8.7376 end through all
sketch "Sketch8" plane through (0, 0, 6.35) normal (0, 0, 1) x (1, 0, 0)
  circle A0 centre (111.304007, 39.007024) radius 3.175
  circle A1 centre (175.74499, 60.890333) radius 3.175
  circle A2 centre (111.304007, 39.007024) radius 9.525
  circle A3 centre (175.74499, 60.890333) radius 9.525
  point P0 (0, 0)
  dimension "d235" = 19.05
  dimension "d236" = 19.05
extrude "Extrusion5" cut sketch "Sketch8" against normal blind 1.190625
sketch "Sketch9" plane through (0, 0, 0) normal (0, 0, -1) x (-1, 0, 0)
  circle A0 centre (-111.304007, 39.007024) radius 3.175
  circle A1 centre (-175.74499, 60.890333) radius 3.175
  circle A2 centre (-175.74499, 60.890333) radius 9.525
  circle A3 centre (-179.620141, 39.908401) radius 4.3688
  circle A4 centre (-120.927752, 20.728389) radius 4.3688
  circle A5 centre (-111.304007, 39.007024) radius 3.175
  circle A6 centre (-127.673753, 96.62524) radius 3.175
  circle A7 centre (-175.74499, 60.890333) radius 3.175
  circle A8 centre (-122.984877, 56.125911) radius 1.3208
  circle A9 centre (-156.055077, 67.356115) radius 1.3208
  circle A10 centre (-152.4, 23.8125) radius 17.4625
  circle A11 centre (-139.519977, 61.741013) radius 11.1125
  arc A12 (-182.101149, 83.849872) -> (-192.172651, 78.107645) centre (-185.852899, 78.726702) ccw
  line L0 (-186.526662, 20.469591) -> (-192.172651, 78.107645)
  arc A13 (-186.526662, 20.469591) -> (-127.503315, 0.233714) centre (-152.4, 23.8125) ccw
  line L1 (-87.883117, 42.06842) -> (-127.503315, 0.233714)
  arc A14 (-87.883117, 42.06842) -> (-92.528233, 52.784767) centre (-92.493614, 46.434861) ccw
  arc A15 (-109.813264, 111.278343) -> (-92.528233, 52.784767) centre (-92.701327, 84.534295) ccw
  arc A16 (-109.813264, 111.278343) -> (-111.377577, 117.124349) centre (-111.524457, 113.952748) ccw
  arc A17 (-128.329199, 122.980144) -> (-111.377577, 117.124349) centre (-109.908777, 148.840356) ccw
  arc A18 (-128.329199, 122.980144) -> (-133.1868, 119.400632) centre (-130.171241, 120.394123) ccw
  arc A19 (-182.101149, 83.849872) -> (-133.1868, 119.400632) centre (-163.342398, 109.465722) ccw
  circle A20 centre (-111.304007, 39.007024) radius 9.525
  point P0 (0, 0)
extrude "Extrusion6" cut sketch "Sketch9" against normal blind 1.190625 contours A2 | A20
equation "\"d9\" = Gear15tPD"
equation "\"d10\" = Gear28tPD"
equation "\"d11\" = 0.5 * Gear48tPD + 0.5 * Gear15tPD + MeshingClearance"
equation "\"d12\" = CimOD"
equation "\"d13\" = CimOD"
equation "\"d14\" = CimOD"
equation "\"d17\" = Gear28tPD + ClearanceDiameter"
equation "\"d18\" = WheelOD"
equation "\"d19\" = WheelClearance"
equation "\"Pulley48tPD\" = 45.8"
equation "\"Pulley19tPD\" = 18.2"
equation "\"Pulley16tPD\" = 15.3"
equation "\"Gear15tPD\" = 19.05"
equation "\"Gear35tPD\" = 44.45"
equation "\"Gear48tPD\" = 60.96"
equation "\"Gear28tPD\" = 35.56"
equation "\"BearingLargeOD\" = 28.575"
equation "\"BearingSmallOD\" = 22.225"
equation "\"MeshingClearance\" = 0.0508"
equation "\"CimOD\" = 63.5"
equation "\"WheelOD\" = 93.98"
equation "\"ClearanceDiameter\" = 7.62"
equation "\"WheelClearance\" = 101.6"
equation "\"TensioningBearingID\" = 6.35"
equation "\"TensioningBearingOD\" = 15.875"
equation "\"SpingClipClearance\" = 8.89"
equation "\"Pi\" = 79.79645"
equation "\"Pulley56tPD\" = 53.5"
equation "\"BearingXLargeOD\" = 34.925"
properties part number "OutlineSketch1" material "Aluminum 6061"
